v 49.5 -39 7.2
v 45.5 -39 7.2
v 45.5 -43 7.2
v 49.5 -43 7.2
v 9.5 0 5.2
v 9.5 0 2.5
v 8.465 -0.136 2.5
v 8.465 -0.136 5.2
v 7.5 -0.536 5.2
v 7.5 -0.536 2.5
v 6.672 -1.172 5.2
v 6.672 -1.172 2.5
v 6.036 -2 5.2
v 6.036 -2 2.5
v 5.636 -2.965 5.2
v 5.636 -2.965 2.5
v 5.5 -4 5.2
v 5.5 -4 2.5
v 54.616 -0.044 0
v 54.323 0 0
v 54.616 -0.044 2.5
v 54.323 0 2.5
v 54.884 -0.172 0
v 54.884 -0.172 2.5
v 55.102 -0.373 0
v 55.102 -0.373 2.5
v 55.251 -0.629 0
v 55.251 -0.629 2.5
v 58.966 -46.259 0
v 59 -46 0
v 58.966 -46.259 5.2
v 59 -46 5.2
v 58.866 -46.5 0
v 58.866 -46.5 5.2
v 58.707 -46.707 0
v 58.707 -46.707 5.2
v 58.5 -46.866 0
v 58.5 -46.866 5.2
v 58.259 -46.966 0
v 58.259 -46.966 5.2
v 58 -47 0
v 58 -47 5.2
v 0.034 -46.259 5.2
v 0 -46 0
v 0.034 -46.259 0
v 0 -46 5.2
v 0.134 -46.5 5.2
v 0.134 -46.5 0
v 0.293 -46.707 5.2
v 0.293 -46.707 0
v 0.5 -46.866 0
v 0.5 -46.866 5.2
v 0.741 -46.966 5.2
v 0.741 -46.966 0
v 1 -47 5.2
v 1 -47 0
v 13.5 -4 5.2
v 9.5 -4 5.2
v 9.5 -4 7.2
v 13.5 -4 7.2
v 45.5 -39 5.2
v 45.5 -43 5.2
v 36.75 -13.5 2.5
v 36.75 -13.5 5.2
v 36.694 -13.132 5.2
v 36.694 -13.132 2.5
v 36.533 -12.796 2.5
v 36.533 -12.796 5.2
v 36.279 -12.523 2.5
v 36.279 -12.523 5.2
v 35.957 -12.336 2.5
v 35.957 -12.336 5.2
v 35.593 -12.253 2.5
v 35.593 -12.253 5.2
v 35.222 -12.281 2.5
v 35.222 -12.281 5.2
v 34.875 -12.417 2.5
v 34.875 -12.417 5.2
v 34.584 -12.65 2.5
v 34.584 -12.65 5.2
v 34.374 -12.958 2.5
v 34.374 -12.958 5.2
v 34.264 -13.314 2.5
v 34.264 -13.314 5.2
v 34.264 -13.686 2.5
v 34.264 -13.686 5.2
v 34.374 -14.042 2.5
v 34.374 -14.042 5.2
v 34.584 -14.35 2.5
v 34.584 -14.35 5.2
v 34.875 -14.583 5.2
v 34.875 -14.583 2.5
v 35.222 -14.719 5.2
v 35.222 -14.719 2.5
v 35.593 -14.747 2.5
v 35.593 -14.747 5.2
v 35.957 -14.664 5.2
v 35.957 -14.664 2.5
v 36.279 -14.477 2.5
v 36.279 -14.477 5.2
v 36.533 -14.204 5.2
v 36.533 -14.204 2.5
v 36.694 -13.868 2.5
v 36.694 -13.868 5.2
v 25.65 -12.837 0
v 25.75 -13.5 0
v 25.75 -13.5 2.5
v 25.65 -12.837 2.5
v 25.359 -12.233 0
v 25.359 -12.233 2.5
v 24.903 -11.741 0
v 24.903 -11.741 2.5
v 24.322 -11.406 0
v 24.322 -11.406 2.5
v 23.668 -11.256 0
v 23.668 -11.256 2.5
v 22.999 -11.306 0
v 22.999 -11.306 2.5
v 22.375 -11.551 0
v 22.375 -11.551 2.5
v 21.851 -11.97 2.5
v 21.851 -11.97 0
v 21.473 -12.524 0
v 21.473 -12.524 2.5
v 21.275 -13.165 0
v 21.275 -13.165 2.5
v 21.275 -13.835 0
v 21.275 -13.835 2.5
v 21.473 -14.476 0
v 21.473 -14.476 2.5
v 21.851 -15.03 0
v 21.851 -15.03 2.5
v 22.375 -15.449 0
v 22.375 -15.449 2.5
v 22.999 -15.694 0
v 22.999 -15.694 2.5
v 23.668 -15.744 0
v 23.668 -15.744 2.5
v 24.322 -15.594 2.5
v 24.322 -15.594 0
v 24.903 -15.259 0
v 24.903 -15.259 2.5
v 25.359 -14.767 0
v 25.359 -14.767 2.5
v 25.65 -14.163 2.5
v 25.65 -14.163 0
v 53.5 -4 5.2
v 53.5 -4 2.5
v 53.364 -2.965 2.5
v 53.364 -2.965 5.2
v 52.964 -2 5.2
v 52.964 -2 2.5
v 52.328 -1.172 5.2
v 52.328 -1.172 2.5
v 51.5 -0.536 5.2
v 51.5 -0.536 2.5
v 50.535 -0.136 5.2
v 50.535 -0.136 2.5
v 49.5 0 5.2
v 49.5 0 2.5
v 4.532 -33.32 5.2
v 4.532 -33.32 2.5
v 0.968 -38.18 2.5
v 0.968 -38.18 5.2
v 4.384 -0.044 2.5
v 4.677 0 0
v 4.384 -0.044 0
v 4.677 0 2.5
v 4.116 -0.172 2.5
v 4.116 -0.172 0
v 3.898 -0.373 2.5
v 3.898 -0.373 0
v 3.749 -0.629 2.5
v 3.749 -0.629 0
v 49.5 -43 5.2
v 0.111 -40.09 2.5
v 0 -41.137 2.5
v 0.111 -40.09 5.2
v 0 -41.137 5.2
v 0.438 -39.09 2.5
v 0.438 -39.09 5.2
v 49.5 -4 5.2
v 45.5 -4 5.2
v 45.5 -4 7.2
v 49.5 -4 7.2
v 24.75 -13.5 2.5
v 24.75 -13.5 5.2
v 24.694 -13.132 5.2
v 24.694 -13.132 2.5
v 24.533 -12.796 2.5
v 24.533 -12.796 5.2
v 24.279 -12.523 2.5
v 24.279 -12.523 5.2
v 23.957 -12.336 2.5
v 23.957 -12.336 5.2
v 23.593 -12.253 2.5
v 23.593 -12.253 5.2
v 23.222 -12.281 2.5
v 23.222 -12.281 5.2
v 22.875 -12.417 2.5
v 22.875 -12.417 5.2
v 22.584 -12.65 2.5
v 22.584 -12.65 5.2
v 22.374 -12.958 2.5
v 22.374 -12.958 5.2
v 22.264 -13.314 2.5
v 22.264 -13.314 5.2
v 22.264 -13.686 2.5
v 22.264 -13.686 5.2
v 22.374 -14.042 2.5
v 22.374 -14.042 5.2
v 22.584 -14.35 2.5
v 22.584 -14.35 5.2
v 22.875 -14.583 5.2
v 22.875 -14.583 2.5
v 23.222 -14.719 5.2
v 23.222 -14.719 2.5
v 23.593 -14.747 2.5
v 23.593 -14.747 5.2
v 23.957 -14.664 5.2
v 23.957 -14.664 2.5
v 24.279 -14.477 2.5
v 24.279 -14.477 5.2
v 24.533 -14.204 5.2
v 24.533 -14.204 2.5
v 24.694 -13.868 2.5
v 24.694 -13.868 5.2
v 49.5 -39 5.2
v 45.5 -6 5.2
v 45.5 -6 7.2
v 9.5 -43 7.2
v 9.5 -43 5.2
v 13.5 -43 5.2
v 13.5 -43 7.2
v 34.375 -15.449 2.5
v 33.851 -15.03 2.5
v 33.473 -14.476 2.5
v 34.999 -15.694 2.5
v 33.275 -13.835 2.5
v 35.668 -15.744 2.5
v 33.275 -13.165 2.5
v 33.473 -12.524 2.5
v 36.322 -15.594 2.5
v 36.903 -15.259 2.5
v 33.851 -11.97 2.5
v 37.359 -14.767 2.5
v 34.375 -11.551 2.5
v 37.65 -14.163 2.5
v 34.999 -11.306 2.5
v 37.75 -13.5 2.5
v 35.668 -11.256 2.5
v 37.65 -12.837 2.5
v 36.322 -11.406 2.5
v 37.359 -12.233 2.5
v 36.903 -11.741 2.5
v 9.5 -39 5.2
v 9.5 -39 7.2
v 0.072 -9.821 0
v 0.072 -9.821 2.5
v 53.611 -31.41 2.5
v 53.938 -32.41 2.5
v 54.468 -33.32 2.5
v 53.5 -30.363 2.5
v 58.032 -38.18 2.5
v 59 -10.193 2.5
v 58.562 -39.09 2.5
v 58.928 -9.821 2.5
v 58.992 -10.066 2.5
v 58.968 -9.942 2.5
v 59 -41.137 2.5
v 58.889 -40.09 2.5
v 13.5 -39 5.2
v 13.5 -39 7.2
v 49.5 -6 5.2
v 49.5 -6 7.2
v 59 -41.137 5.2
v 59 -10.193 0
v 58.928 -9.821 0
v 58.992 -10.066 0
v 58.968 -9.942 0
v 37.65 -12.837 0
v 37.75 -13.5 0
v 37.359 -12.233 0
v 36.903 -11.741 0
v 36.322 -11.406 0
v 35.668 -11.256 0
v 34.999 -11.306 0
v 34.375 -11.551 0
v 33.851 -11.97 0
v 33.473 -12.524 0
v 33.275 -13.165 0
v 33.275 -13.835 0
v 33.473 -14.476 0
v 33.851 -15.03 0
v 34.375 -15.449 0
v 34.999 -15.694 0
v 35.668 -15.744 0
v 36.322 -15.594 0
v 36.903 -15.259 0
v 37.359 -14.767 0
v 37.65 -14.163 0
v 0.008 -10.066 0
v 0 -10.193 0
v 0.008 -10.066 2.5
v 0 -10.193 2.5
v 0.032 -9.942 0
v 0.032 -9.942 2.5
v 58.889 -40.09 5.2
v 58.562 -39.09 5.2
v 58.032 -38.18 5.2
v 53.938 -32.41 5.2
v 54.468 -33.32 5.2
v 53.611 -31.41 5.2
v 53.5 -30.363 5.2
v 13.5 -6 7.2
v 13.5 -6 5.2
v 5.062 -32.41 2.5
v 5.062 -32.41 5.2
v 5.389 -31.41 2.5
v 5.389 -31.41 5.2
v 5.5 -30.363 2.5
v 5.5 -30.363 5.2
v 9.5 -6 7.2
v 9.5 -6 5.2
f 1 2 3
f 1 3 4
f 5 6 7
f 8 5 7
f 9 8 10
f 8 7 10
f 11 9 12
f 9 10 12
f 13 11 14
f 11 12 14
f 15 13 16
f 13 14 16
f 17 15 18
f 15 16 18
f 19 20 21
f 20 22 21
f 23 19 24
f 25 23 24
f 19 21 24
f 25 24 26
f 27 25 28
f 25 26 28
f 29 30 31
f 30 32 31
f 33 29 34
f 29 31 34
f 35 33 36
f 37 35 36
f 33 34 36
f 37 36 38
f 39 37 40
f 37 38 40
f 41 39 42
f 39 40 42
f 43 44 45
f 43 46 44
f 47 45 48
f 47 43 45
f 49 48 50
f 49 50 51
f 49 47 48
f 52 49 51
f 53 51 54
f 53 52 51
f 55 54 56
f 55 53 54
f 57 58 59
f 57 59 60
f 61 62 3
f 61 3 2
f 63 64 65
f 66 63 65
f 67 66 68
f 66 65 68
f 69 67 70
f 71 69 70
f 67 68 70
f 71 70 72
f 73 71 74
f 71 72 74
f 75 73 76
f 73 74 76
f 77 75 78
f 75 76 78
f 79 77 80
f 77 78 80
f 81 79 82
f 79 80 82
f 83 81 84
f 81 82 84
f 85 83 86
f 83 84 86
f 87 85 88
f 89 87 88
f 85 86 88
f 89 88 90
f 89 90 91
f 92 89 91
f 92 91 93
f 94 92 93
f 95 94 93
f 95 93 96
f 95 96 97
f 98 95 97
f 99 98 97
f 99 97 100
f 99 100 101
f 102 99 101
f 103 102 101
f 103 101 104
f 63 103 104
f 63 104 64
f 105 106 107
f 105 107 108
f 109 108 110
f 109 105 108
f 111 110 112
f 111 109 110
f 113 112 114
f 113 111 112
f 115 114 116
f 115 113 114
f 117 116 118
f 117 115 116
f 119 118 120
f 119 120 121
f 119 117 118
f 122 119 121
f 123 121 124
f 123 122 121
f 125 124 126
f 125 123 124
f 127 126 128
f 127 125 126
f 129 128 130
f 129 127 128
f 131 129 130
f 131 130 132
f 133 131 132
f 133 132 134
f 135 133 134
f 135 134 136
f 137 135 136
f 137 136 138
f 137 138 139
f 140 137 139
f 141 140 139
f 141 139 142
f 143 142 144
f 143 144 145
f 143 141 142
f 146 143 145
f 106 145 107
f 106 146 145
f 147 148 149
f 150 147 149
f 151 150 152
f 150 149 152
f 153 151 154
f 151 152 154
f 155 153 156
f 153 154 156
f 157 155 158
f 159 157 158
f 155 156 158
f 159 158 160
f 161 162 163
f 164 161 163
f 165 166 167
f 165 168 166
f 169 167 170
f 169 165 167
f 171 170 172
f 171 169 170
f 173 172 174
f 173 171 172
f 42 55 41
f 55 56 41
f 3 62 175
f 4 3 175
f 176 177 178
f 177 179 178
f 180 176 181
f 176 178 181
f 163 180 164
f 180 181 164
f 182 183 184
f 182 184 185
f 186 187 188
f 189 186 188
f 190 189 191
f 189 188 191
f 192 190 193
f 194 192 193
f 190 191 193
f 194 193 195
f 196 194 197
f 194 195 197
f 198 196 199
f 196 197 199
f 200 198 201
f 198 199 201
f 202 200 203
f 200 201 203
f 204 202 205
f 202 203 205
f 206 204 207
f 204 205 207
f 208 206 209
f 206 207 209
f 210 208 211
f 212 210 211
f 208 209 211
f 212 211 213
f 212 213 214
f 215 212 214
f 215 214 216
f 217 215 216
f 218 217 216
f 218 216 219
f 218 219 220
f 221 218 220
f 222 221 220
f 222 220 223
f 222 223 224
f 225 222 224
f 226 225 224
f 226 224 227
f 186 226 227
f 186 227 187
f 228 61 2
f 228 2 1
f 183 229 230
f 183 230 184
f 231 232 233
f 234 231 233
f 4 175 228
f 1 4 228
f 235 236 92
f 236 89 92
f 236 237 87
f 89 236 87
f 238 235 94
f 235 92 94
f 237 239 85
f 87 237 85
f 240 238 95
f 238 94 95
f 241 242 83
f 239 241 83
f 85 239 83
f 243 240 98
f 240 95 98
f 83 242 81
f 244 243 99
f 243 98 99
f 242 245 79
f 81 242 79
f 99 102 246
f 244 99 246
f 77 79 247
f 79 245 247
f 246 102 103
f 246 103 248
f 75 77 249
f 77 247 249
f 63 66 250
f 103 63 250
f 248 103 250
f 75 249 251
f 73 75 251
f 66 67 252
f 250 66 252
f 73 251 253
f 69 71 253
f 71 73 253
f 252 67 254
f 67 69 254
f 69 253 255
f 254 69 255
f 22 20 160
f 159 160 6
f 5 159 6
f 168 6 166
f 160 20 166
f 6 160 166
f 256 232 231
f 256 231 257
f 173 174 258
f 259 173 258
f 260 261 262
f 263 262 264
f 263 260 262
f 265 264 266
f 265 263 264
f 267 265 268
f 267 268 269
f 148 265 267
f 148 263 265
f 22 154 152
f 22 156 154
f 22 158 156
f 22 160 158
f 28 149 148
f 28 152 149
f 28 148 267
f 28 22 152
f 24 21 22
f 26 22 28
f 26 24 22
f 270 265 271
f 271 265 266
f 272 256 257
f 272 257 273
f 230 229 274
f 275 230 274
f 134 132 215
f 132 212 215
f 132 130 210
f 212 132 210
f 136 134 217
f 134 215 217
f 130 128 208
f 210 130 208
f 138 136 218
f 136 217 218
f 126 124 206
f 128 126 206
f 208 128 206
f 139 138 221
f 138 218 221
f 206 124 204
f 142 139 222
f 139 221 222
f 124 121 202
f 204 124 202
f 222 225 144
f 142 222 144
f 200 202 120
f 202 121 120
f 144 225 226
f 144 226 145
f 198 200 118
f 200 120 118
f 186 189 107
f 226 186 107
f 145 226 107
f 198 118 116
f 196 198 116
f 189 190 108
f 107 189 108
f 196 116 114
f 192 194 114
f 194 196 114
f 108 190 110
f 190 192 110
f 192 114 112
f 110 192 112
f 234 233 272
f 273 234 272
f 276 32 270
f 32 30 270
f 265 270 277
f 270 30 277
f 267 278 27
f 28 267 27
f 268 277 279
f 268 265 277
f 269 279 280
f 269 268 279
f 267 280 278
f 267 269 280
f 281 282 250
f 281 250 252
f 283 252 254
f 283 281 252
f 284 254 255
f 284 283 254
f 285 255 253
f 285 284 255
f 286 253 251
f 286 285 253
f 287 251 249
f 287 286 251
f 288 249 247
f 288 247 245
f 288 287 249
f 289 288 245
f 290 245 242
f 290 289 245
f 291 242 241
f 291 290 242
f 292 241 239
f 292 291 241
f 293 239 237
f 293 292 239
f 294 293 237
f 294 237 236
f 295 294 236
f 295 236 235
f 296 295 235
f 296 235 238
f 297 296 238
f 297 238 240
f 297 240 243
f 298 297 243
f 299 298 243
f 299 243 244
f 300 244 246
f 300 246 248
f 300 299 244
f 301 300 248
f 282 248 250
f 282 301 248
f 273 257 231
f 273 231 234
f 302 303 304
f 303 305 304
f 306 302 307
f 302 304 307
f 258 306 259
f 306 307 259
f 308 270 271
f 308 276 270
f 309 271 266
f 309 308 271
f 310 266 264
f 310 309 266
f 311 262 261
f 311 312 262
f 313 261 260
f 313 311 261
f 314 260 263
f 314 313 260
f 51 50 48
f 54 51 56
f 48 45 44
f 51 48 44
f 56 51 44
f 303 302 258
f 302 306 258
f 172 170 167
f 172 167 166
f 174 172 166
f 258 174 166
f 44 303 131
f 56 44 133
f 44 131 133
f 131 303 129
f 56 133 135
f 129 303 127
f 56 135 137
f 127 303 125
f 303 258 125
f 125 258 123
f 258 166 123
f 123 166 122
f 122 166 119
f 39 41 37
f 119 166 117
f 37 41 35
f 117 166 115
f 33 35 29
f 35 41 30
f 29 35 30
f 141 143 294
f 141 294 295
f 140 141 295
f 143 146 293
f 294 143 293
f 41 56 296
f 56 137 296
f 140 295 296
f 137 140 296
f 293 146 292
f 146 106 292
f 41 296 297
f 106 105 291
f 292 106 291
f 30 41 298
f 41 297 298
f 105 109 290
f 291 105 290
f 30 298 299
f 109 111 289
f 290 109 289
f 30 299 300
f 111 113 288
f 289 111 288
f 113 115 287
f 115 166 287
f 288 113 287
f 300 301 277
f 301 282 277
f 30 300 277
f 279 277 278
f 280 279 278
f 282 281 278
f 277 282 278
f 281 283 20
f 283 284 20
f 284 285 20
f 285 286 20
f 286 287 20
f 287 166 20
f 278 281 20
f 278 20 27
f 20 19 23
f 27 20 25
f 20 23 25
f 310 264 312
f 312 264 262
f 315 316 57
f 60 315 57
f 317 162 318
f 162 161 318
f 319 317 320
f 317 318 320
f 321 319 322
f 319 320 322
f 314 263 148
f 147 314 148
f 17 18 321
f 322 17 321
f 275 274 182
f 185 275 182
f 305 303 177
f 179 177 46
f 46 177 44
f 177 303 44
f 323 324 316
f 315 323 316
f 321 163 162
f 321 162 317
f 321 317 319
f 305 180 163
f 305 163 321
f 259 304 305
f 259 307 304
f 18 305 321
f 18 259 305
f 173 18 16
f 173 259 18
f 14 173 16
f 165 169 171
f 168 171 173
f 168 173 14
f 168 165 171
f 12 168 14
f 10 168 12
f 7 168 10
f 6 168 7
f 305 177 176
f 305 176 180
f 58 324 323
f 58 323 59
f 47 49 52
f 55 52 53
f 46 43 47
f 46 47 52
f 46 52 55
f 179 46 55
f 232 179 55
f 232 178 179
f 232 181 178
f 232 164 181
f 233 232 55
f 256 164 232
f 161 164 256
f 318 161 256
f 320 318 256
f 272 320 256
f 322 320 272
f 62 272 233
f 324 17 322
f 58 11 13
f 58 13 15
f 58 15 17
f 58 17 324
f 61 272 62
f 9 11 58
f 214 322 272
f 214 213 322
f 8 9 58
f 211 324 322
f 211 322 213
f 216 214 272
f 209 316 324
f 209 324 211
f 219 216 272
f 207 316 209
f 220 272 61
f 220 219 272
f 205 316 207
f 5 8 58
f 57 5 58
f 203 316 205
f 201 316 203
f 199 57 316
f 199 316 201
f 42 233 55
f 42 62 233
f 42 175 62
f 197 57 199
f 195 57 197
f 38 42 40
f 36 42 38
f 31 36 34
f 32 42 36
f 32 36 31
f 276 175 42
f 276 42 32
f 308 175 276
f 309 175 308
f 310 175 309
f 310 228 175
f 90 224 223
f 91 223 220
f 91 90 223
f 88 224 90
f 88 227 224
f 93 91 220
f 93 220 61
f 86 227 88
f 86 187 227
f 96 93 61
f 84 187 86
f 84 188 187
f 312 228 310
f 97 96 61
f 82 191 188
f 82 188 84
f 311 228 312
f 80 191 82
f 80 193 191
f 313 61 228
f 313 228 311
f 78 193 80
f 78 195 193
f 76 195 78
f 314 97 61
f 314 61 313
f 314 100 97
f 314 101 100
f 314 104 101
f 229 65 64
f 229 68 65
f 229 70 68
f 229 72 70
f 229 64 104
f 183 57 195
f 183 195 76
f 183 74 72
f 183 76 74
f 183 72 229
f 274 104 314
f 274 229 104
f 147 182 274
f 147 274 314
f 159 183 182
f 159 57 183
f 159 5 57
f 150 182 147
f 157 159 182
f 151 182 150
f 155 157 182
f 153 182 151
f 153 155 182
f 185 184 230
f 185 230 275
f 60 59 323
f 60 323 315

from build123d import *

# Parameters (mm, degrees)
F1_DEPTH  = 2.5
F3_DEPTH  = 2.7
F4_R      = 1
F5_R      = 5
F6_W      = 4
F6_H      = 2
F6_H_2    = 4
F7_DEPTH  = 2
F8_R      = 1.25
F9_DEPTH  = 6
F10_R     = 2.25
F11_DEPTH = 2.5


with BuildPart() as f1:
    # F0 (on Top) → F1 (new body)
    with BuildSketch(Plane.XY):
        Polygon((55, 0), (4, 0), (0, -10), (0, -47), (59, -47), (59, -10), align=None)
    extrude(amount=F1_DEPTH)

    # F2 (on face) → F3 (join)
    with BuildSketch(Plane.XY.offset(2.5)):
        with BuildLine():
            Line((0, -39.5), (0, -47))
            Line((0, -47), (59, -47))
            Line((59, -47), (59, -39.5))
            Line((59, -39.5), (53.5, -32))
            Line((53.5, -32), (53.5, -4))
            ThreePointArc((53.5, -4), (52.3284271247, -1.1715728753), (49.5, 0))
            Line((49.5, 0), (9.5, 0))
            ThreePointArc((9.5, 0), (6.6715728753, -1.1715728753), (5.5, -4))
            Line((5.5, -4), (5.5, -32))
            Line((5.5, -32), (0, -39.5))
        make_face()
    extrude(amount=F3_DEPTH)

    # F4
    f4_edges = [f1.edges().sort_by_distance(p)[0] for p in [
        (0, -47, 2.6),
        (59, -47, 2.6),
        (4, 0, 1.25),
        (55, 0, 1.25),
        (59, -10, 1.25),
        (0, -10, 1.25),
    ]]
    fillet(f4_edges, radius=F4_R)

    # F5
    f5_edges = [f1.edges().sort_by_distance(p)[0] for p in [
        (0, -39.5, 3.85),
        (59, -39.5, 3.85),
        (53.5, -32, 3.85),
        (5.5, -32, 3.85),
    ]]
    fillet(f5_edges, radius=F5_R)

    # F6 (on face) → F7 (join)
    with BuildSketch(Plane.XY.offset(5.2)):
        with Locations((11.5, -5)):
            Rectangle(F6_W, F6_H)
        with Locations((11.5, -41)):
            Rectangle(F6_W, F6_H_2)
        with Locations((47.5, -5)):
            Rectangle(F6_W, F6_H)
        with Locations((47.5, -41)):
            Rectangle(F6_W, F6_H_2)
    extrude(amount=F7_DEPTH)

    # F8 (on face) → F9 (cut)
    with BuildSketch(Plane.XY.offset(5.2)):
        with Locations((23.5, -13.5)):
            Circle(F8_R)
        with Locations((35.5, -13.5)):
            Circle(F8_R)
    extrude(amount=-F9_DEPTH, mode=Mode.SUBTRACT)

    # F10 (on face) → F11 (cut)
    with BuildSketch(Plane.XY):
        with Locations((35.5, -13.5)):
            Circle(F10_R)
        with Locations((23.5, -13.5)):
            Circle(F10_R)
    extrude(amount=F11_DEPTH, mode=Mode.SUBTRACT)


solid = f1.part
